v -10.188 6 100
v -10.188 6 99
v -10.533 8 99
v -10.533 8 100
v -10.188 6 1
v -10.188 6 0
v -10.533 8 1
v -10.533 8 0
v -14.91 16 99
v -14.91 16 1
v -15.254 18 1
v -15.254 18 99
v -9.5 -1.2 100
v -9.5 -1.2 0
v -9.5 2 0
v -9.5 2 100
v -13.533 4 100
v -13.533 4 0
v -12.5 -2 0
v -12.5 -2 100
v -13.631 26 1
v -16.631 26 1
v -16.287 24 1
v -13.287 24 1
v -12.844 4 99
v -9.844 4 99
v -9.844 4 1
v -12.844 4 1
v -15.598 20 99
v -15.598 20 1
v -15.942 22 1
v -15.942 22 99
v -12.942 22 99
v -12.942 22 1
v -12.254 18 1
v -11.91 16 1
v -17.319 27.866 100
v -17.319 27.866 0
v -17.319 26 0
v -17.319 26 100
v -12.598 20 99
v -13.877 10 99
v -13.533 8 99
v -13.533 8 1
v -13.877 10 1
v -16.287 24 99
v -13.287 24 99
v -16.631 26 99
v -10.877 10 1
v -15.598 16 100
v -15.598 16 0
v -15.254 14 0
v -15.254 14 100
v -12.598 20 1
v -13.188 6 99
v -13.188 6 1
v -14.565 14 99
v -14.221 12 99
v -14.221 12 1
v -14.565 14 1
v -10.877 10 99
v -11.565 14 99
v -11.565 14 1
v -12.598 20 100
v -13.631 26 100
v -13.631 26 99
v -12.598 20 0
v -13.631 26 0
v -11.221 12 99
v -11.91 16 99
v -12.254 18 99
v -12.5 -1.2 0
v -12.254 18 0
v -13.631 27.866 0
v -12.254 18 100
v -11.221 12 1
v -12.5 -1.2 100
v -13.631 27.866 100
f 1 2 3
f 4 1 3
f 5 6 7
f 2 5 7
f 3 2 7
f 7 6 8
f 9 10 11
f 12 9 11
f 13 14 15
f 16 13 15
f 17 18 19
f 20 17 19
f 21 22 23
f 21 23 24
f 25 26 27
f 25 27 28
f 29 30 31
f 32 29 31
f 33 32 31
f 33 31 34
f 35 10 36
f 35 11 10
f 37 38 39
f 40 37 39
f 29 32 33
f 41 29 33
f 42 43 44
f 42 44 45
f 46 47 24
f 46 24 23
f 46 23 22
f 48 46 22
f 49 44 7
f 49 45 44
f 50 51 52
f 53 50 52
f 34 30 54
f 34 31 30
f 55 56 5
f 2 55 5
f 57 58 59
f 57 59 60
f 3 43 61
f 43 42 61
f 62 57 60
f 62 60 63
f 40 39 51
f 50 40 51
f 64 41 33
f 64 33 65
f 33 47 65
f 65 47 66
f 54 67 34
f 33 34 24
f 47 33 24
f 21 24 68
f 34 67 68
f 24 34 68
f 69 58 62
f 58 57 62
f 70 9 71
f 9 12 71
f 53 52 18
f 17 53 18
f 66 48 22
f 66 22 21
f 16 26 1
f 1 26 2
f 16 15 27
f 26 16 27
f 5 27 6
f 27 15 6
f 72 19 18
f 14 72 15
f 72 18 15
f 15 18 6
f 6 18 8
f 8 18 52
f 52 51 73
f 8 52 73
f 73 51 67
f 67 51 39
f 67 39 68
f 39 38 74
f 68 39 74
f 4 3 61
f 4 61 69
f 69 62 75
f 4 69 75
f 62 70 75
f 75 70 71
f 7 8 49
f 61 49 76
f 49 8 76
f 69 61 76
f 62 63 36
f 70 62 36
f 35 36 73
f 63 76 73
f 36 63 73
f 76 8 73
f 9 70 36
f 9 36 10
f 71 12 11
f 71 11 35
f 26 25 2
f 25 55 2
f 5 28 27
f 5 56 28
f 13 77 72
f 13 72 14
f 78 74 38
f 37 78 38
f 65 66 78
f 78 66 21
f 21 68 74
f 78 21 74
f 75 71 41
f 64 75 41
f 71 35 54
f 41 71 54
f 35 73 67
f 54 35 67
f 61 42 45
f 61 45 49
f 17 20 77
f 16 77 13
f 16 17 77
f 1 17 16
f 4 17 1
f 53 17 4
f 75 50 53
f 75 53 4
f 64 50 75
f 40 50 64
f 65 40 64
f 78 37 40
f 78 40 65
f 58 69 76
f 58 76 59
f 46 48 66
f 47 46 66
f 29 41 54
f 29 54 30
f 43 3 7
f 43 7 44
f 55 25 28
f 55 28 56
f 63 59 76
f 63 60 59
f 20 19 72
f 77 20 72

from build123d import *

# Parameters (mm, degrees)
F1_DEPTH = 100
F2_DEPTH = 1
F3_START = 99
F3_DEPTH = 1


with BuildPart() as f1:
    # F0 (on Top) → F1 (new body)
    with BuildSketch(Plane.XY):
        Polygon((-10.3999599814, 2), (-12.5, 2), (-12.5, -1.2), (-9.5, -1.2), (-9.5, 1.1444095289), (-9.5, 2), align=None)
        Polygon((-12.5, -1.2), (-12.5, 2), (-12.8442417498, 4), (-13.5327252493, 4), (-12.5, -2), align=None)
        Polygon((-12.8442417498, 4), (-12.5, 2), (-10.3999599814, 2), (-9.5, 2), (-9.8442417498, 4), align=None)
        Polygon((-13.5327252493, 4), (-12.8442417498, 4), (-13.1884834996, 6), (-13.8769669991, 6), align=None)
        Polygon((-13.5327252493, 8), (-13.1884834996, 6), (-10.1884834996, 6), (-10.5327252493, 8), align=None)
        Polygon((-13.8769669991, 6), (-13.1884834996, 6), (-13.5327252493, 8), (-14.2212087489, 8), align=None)
        Polygon((-14.2212087489, 8), (-13.5327252493, 8), (-13.8769669991, 10), (-14.5654504987, 10), align=None)
        Polygon((-14.2212087489, 12), (-13.8769669991, 10), (-10.8769669991, 10), (-11.2212087489, 12), align=None)
        Polygon((-14.9096922485, 16), (-14.5654504987, 14), (-11.5654504987, 14), (-11.9096922485, 16), align=None)
        Polygon((-15.598175748, 20), (-15.2539339983, 18), (-12.2539339983, 18), (-12.598175748, 20), align=None)
        Polygon((-14.5654504987, 10), (-13.8769669991, 10), (-14.2212087489, 12), (-14.9096922485, 12), align=None)
        Polygon((-14.9096922485, 12), (-14.2212087489, 12), (-14.5654504987, 14), (-15.2539339983, 14), align=None)
        Polygon((-15.2539339983, 14), (-14.5654504987, 14), (-14.9096922485, 16), (-15.598175748, 16), align=None)
        Polygon((-15.598175748, 16), (-14.9096922485, 16), (-15.2539339983, 18), (-15.9424174978, 18), align=None)
        Polygon((-15.9424174978, 18), (-15.2539339983, 18), (-15.598175748, 20), (-16.2866592476, 20), align=None)
        Polygon((-16.2866592476, 20), (-15.598175748, 20), (-15.9424174978, 22), (-16.6309009974, 22), align=None)
        Polygon((-16.6309009974, 22), (-15.9424174978, 22), (-16.2866592476, 24), (-16.9751427472, 24), align=None)
        Polygon((-16.9751427472, 24), (-16.2866592476, 24), (-16.6309009974, 26), (-17.319384497, 26), align=None)
        Polygon((-17.319384497, 26), (-16.6309009974, 26), (-13.6309009974, 26), (-13.6309009974, 27.8660617122), (-17.319384497, 27.8660617122), align=None)
        Polygon((-16.2866592476, 24), (-15.9424174978, 22), (-12.9424174978, 22), (-13.2866592476, 24), align=None)
    extrude(amount=F1_DEPTH)

    # F0 (on Top) → F2 (join)
    with BuildSketch(Plane.XY):
        Polygon((-12.8442417498, 4), (-12.5, 2), (-10.3999599814, 2), (-9.5, 2), (-9.8442417498, 4), align=None)
        Polygon((-12.5, -1.2), (-12.5, 2), (-12.8442417498, 4), (-13.5327252493, 4), (-12.5, -2), align=None)
        Polygon((-13.1884834996, 6), (-12.8442417498, 4), (-9.8442417498, 4), (-10.1884834996, 6), align=None)
        Polygon((-13.5327252493, 4), (-12.8442417498, 4), (-13.1884834996, 6), (-13.8769669991, 6), align=None)
        Polygon((-13.5327252493, 8), (-13.1884834996, 6), (-10.1884834996, 6), (-10.5327252493, 8), align=None)
        Polygon((-13.8769669991, 6), (-13.1884834996, 6), (-13.5327252493, 8), (-14.2212087489, 8), align=None)
        Polygon((-13.8769669991, 10), (-13.5327252493, 8), (-10.5327252493, 8), (-10.8769669991, 10), align=None)
        Polygon((-14.2212087489, 8), (-13.5327252493, 8), (-13.8769669991, 10), (-14.5654504987, 10), align=None)
        Polygon((-14.2212087489, 12), (-13.8769669991, 10), (-10.8769669991, 10), (-11.2212087489, 12), align=None)
        Polygon((-14.5654504987, 10), (-13.8769669991, 10), (-14.2212087489, 12), (-14.9096922485, 12), align=None)
        Polygon((-14.5654504987, 14), (-14.2212087489, 12), (-11.2212087489, 12), (-11.5654504987, 14), align=None)
        Polygon((-14.9096922485, 12), (-14.2212087489, 12), (-14.5654504987, 14), (-15.2539339983, 14), align=None)
        Polygon((-14.9096922485, 16), (-14.5654504987, 14), (-11.5654504987, 14), (-11.9096922485, 16), align=None)
        Polygon((-15.2539339983, 14), (-14.5654504987, 14), (-14.9096922485, 16), (-15.598175748, 16), align=None)
        Polygon((-15.2539339983, 18), (-14.9096922485, 16), (-11.9096922485, 16), (-12.2539339983, 18), align=None)
        Polygon((-15.598175748, 16), (-14.9096922485, 16), (-15.2539339983, 18), (-15.9424174978, 18), align=None)
        Polygon((-15.598175748, 20), (-15.2539339983, 18), (-12.2539339983, 18), (-12.598175748, 20), align=None)
        Polygon((-15.9424174978, 18), (-15.2539339983, 18), (-15.598175748, 20), (-16.2866592476, 20), align=None)
        Polygon((-15.9424174978, 22), (-15.598175748, 20), (-12.598175748, 20), (-12.9424174978, 22), align=None)
        Polygon((-16.2866592476, 20), (-15.598175748, 20), (-15.9424174978, 22), (-16.6309009974, 22), align=None)
        Polygon((-16.2866592476, 24), (-15.9424174978, 22), (-12.9424174978, 22), (-13.2866592476, 24), align=None)
        Polygon((-16.6309009974, 22), (-15.9424174978, 22), (-16.2866592476, 24), (-16.9751427472, 24), align=None)
        Polygon((-16.6309009974, 26), (-16.2866592476, 24), (-13.2866592476, 24), (-13.6309009974, 26), align=None)
        Polygon((-16.9751427472, 24), (-16.2866592476, 24), (-16.6309009974, 26), (-17.319384497, 26), align=None)
        Polygon((-17.319384497, 26), (-16.6309009974, 26), (-13.6309009974, 26), (-13.6309009974, 27.8660617122), (-17.319384497, 27.8660617122), align=None)
    extrude(amount=F2_DEPTH)

    # F0 (on Top) → F3 (join)
    with BuildSketch(Plane.XY.offset(F3_START)):
        Polygon((-12.8442417498, 4), (-12.5, 2), (-10.3999599814, 2), (-9.5, 2), (-9.8442417498, 4), align=None)
        Polygon((-10.3999599814, 2), (-12.5, 2), (-12.5, -1.2), (-9.5, -1.2), (-9.5, 1.1444095289), (-9.5, 2), align=None)
        Polygon((-12.5, -1.2), (-12.5, 2), (-12.8442417498, 4), (-13.5327252493, 4), (-12.5, -2), align=None)
        Polygon((-13.1884834996, 6), (-12.8442417498, 4), (-9.8442417498, 4), (-10.1884834996, 6), align=None)
        Polygon((-13.5327252493, 4), (-12.8442417498, 4), (-13.1884834996, 6), (-13.8769669991, 6), align=None)
        Polygon((-13.5327252493, 8), (-13.1884834996, 6), (-10.1884834996, 6), (-10.5327252493, 8), align=None)
        Polygon((-13.8769669991, 6), (-13.1884834996, 6), (-13.5327252493, 8), (-14.2212087489, 8), align=None)
        Polygon((-13.8769669991, 10), (-13.5327252493, 8), (-10.5327252493, 8), (-10.8769669991, 10), align=None)
        Polygon((-14.2212087489, 8), (-13.5327252493, 8), (-13.8769669991, 10), (-14.5654504987, 10), align=None)
        Polygon((-14.2212087489, 12), (-13.8769669991, 10), (-10.8769669991, 10), (-11.2212087489, 12), align=None)
        Polygon((-14.5654504987, 10), (-13.8769669991, 10), (-14.2212087489, 12), (-14.9096922485, 12), align=None)
        Polygon((-14.5654504987, 14), (-14.2212087489, 12), (-11.2212087489, 12), (-11.5654504987, 14), align=None)
        Polygon((-14.9096922485, 12), (-14.2212087489, 12), (-14.5654504987, 14), (-15.2539339983, 14), align=None)
        Polygon((-14.9096922485, 16), (-14.5654504987, 14), (-11.5654504987, 14), (-11.9096922485, 16), align=None)
        Polygon((-15.2539339983, 14), (-14.5654504987, 14), (-14.9096922485, 16), (-15.598175748, 16), align=None)
        Polygon((-15.2539339983, 18), (-14.9096922485, 16), (-11.9096922485, 16), (-12.2539339983, 18), align=None)
        Polygon((-15.598175748, 16), (-14.9096922485, 16), (-15.2539339983, 18), (-15.9424174978, 18), align=None)
        Polygon((-15.598175748, 20), (-15.2539339983, 18), (-12.2539339983, 18), (-12.598175748, 20), align=None)
        Polygon((-15.9424174978, 18), (-15.2539339983, 18), (-15.598175748, 20), (-16.2866592476, 20), align=None)
        Polygon((-15.9424174978, 22), (-15.598175748, 20), (-12.598175748, 20), (-12.9424174978, 22), align=None)
        Polygon((-16.2866592476, 20), (-15.598175748, 20), (-15.9424174978, 22), (-16.6309009974, 22), align=None)
        Polygon((-16.2866592476, 24), (-15.9424174978, 22), (-12.9424174978, 22), (-13.2866592476, 24), align=None)
        Polygon((-16.6309009974, 22), (-15.9424174978, 22), (-16.2866592476, 24), (-16.9751427472, 24), align=None)
        Polygon((-16.6309009974, 26), (-16.2866592476, 24), (-13.2866592476, 24), (-13.6309009974, 26), align=None)
        Polygon((-16.9751427472, 24), (-16.2866592476, 24), (-16.6309009974, 26), (-17.319384497, 26), align=None)
        Polygon((-17.319384497, 26), (-16.6309009974, 26), (-13.6309009974, 26), (-13.6309009974, 27.8660617122), (-17.319384497, 27.8660617122), align=None)
    extrude(amount=F3_DEPTH)


solid = f1.part
